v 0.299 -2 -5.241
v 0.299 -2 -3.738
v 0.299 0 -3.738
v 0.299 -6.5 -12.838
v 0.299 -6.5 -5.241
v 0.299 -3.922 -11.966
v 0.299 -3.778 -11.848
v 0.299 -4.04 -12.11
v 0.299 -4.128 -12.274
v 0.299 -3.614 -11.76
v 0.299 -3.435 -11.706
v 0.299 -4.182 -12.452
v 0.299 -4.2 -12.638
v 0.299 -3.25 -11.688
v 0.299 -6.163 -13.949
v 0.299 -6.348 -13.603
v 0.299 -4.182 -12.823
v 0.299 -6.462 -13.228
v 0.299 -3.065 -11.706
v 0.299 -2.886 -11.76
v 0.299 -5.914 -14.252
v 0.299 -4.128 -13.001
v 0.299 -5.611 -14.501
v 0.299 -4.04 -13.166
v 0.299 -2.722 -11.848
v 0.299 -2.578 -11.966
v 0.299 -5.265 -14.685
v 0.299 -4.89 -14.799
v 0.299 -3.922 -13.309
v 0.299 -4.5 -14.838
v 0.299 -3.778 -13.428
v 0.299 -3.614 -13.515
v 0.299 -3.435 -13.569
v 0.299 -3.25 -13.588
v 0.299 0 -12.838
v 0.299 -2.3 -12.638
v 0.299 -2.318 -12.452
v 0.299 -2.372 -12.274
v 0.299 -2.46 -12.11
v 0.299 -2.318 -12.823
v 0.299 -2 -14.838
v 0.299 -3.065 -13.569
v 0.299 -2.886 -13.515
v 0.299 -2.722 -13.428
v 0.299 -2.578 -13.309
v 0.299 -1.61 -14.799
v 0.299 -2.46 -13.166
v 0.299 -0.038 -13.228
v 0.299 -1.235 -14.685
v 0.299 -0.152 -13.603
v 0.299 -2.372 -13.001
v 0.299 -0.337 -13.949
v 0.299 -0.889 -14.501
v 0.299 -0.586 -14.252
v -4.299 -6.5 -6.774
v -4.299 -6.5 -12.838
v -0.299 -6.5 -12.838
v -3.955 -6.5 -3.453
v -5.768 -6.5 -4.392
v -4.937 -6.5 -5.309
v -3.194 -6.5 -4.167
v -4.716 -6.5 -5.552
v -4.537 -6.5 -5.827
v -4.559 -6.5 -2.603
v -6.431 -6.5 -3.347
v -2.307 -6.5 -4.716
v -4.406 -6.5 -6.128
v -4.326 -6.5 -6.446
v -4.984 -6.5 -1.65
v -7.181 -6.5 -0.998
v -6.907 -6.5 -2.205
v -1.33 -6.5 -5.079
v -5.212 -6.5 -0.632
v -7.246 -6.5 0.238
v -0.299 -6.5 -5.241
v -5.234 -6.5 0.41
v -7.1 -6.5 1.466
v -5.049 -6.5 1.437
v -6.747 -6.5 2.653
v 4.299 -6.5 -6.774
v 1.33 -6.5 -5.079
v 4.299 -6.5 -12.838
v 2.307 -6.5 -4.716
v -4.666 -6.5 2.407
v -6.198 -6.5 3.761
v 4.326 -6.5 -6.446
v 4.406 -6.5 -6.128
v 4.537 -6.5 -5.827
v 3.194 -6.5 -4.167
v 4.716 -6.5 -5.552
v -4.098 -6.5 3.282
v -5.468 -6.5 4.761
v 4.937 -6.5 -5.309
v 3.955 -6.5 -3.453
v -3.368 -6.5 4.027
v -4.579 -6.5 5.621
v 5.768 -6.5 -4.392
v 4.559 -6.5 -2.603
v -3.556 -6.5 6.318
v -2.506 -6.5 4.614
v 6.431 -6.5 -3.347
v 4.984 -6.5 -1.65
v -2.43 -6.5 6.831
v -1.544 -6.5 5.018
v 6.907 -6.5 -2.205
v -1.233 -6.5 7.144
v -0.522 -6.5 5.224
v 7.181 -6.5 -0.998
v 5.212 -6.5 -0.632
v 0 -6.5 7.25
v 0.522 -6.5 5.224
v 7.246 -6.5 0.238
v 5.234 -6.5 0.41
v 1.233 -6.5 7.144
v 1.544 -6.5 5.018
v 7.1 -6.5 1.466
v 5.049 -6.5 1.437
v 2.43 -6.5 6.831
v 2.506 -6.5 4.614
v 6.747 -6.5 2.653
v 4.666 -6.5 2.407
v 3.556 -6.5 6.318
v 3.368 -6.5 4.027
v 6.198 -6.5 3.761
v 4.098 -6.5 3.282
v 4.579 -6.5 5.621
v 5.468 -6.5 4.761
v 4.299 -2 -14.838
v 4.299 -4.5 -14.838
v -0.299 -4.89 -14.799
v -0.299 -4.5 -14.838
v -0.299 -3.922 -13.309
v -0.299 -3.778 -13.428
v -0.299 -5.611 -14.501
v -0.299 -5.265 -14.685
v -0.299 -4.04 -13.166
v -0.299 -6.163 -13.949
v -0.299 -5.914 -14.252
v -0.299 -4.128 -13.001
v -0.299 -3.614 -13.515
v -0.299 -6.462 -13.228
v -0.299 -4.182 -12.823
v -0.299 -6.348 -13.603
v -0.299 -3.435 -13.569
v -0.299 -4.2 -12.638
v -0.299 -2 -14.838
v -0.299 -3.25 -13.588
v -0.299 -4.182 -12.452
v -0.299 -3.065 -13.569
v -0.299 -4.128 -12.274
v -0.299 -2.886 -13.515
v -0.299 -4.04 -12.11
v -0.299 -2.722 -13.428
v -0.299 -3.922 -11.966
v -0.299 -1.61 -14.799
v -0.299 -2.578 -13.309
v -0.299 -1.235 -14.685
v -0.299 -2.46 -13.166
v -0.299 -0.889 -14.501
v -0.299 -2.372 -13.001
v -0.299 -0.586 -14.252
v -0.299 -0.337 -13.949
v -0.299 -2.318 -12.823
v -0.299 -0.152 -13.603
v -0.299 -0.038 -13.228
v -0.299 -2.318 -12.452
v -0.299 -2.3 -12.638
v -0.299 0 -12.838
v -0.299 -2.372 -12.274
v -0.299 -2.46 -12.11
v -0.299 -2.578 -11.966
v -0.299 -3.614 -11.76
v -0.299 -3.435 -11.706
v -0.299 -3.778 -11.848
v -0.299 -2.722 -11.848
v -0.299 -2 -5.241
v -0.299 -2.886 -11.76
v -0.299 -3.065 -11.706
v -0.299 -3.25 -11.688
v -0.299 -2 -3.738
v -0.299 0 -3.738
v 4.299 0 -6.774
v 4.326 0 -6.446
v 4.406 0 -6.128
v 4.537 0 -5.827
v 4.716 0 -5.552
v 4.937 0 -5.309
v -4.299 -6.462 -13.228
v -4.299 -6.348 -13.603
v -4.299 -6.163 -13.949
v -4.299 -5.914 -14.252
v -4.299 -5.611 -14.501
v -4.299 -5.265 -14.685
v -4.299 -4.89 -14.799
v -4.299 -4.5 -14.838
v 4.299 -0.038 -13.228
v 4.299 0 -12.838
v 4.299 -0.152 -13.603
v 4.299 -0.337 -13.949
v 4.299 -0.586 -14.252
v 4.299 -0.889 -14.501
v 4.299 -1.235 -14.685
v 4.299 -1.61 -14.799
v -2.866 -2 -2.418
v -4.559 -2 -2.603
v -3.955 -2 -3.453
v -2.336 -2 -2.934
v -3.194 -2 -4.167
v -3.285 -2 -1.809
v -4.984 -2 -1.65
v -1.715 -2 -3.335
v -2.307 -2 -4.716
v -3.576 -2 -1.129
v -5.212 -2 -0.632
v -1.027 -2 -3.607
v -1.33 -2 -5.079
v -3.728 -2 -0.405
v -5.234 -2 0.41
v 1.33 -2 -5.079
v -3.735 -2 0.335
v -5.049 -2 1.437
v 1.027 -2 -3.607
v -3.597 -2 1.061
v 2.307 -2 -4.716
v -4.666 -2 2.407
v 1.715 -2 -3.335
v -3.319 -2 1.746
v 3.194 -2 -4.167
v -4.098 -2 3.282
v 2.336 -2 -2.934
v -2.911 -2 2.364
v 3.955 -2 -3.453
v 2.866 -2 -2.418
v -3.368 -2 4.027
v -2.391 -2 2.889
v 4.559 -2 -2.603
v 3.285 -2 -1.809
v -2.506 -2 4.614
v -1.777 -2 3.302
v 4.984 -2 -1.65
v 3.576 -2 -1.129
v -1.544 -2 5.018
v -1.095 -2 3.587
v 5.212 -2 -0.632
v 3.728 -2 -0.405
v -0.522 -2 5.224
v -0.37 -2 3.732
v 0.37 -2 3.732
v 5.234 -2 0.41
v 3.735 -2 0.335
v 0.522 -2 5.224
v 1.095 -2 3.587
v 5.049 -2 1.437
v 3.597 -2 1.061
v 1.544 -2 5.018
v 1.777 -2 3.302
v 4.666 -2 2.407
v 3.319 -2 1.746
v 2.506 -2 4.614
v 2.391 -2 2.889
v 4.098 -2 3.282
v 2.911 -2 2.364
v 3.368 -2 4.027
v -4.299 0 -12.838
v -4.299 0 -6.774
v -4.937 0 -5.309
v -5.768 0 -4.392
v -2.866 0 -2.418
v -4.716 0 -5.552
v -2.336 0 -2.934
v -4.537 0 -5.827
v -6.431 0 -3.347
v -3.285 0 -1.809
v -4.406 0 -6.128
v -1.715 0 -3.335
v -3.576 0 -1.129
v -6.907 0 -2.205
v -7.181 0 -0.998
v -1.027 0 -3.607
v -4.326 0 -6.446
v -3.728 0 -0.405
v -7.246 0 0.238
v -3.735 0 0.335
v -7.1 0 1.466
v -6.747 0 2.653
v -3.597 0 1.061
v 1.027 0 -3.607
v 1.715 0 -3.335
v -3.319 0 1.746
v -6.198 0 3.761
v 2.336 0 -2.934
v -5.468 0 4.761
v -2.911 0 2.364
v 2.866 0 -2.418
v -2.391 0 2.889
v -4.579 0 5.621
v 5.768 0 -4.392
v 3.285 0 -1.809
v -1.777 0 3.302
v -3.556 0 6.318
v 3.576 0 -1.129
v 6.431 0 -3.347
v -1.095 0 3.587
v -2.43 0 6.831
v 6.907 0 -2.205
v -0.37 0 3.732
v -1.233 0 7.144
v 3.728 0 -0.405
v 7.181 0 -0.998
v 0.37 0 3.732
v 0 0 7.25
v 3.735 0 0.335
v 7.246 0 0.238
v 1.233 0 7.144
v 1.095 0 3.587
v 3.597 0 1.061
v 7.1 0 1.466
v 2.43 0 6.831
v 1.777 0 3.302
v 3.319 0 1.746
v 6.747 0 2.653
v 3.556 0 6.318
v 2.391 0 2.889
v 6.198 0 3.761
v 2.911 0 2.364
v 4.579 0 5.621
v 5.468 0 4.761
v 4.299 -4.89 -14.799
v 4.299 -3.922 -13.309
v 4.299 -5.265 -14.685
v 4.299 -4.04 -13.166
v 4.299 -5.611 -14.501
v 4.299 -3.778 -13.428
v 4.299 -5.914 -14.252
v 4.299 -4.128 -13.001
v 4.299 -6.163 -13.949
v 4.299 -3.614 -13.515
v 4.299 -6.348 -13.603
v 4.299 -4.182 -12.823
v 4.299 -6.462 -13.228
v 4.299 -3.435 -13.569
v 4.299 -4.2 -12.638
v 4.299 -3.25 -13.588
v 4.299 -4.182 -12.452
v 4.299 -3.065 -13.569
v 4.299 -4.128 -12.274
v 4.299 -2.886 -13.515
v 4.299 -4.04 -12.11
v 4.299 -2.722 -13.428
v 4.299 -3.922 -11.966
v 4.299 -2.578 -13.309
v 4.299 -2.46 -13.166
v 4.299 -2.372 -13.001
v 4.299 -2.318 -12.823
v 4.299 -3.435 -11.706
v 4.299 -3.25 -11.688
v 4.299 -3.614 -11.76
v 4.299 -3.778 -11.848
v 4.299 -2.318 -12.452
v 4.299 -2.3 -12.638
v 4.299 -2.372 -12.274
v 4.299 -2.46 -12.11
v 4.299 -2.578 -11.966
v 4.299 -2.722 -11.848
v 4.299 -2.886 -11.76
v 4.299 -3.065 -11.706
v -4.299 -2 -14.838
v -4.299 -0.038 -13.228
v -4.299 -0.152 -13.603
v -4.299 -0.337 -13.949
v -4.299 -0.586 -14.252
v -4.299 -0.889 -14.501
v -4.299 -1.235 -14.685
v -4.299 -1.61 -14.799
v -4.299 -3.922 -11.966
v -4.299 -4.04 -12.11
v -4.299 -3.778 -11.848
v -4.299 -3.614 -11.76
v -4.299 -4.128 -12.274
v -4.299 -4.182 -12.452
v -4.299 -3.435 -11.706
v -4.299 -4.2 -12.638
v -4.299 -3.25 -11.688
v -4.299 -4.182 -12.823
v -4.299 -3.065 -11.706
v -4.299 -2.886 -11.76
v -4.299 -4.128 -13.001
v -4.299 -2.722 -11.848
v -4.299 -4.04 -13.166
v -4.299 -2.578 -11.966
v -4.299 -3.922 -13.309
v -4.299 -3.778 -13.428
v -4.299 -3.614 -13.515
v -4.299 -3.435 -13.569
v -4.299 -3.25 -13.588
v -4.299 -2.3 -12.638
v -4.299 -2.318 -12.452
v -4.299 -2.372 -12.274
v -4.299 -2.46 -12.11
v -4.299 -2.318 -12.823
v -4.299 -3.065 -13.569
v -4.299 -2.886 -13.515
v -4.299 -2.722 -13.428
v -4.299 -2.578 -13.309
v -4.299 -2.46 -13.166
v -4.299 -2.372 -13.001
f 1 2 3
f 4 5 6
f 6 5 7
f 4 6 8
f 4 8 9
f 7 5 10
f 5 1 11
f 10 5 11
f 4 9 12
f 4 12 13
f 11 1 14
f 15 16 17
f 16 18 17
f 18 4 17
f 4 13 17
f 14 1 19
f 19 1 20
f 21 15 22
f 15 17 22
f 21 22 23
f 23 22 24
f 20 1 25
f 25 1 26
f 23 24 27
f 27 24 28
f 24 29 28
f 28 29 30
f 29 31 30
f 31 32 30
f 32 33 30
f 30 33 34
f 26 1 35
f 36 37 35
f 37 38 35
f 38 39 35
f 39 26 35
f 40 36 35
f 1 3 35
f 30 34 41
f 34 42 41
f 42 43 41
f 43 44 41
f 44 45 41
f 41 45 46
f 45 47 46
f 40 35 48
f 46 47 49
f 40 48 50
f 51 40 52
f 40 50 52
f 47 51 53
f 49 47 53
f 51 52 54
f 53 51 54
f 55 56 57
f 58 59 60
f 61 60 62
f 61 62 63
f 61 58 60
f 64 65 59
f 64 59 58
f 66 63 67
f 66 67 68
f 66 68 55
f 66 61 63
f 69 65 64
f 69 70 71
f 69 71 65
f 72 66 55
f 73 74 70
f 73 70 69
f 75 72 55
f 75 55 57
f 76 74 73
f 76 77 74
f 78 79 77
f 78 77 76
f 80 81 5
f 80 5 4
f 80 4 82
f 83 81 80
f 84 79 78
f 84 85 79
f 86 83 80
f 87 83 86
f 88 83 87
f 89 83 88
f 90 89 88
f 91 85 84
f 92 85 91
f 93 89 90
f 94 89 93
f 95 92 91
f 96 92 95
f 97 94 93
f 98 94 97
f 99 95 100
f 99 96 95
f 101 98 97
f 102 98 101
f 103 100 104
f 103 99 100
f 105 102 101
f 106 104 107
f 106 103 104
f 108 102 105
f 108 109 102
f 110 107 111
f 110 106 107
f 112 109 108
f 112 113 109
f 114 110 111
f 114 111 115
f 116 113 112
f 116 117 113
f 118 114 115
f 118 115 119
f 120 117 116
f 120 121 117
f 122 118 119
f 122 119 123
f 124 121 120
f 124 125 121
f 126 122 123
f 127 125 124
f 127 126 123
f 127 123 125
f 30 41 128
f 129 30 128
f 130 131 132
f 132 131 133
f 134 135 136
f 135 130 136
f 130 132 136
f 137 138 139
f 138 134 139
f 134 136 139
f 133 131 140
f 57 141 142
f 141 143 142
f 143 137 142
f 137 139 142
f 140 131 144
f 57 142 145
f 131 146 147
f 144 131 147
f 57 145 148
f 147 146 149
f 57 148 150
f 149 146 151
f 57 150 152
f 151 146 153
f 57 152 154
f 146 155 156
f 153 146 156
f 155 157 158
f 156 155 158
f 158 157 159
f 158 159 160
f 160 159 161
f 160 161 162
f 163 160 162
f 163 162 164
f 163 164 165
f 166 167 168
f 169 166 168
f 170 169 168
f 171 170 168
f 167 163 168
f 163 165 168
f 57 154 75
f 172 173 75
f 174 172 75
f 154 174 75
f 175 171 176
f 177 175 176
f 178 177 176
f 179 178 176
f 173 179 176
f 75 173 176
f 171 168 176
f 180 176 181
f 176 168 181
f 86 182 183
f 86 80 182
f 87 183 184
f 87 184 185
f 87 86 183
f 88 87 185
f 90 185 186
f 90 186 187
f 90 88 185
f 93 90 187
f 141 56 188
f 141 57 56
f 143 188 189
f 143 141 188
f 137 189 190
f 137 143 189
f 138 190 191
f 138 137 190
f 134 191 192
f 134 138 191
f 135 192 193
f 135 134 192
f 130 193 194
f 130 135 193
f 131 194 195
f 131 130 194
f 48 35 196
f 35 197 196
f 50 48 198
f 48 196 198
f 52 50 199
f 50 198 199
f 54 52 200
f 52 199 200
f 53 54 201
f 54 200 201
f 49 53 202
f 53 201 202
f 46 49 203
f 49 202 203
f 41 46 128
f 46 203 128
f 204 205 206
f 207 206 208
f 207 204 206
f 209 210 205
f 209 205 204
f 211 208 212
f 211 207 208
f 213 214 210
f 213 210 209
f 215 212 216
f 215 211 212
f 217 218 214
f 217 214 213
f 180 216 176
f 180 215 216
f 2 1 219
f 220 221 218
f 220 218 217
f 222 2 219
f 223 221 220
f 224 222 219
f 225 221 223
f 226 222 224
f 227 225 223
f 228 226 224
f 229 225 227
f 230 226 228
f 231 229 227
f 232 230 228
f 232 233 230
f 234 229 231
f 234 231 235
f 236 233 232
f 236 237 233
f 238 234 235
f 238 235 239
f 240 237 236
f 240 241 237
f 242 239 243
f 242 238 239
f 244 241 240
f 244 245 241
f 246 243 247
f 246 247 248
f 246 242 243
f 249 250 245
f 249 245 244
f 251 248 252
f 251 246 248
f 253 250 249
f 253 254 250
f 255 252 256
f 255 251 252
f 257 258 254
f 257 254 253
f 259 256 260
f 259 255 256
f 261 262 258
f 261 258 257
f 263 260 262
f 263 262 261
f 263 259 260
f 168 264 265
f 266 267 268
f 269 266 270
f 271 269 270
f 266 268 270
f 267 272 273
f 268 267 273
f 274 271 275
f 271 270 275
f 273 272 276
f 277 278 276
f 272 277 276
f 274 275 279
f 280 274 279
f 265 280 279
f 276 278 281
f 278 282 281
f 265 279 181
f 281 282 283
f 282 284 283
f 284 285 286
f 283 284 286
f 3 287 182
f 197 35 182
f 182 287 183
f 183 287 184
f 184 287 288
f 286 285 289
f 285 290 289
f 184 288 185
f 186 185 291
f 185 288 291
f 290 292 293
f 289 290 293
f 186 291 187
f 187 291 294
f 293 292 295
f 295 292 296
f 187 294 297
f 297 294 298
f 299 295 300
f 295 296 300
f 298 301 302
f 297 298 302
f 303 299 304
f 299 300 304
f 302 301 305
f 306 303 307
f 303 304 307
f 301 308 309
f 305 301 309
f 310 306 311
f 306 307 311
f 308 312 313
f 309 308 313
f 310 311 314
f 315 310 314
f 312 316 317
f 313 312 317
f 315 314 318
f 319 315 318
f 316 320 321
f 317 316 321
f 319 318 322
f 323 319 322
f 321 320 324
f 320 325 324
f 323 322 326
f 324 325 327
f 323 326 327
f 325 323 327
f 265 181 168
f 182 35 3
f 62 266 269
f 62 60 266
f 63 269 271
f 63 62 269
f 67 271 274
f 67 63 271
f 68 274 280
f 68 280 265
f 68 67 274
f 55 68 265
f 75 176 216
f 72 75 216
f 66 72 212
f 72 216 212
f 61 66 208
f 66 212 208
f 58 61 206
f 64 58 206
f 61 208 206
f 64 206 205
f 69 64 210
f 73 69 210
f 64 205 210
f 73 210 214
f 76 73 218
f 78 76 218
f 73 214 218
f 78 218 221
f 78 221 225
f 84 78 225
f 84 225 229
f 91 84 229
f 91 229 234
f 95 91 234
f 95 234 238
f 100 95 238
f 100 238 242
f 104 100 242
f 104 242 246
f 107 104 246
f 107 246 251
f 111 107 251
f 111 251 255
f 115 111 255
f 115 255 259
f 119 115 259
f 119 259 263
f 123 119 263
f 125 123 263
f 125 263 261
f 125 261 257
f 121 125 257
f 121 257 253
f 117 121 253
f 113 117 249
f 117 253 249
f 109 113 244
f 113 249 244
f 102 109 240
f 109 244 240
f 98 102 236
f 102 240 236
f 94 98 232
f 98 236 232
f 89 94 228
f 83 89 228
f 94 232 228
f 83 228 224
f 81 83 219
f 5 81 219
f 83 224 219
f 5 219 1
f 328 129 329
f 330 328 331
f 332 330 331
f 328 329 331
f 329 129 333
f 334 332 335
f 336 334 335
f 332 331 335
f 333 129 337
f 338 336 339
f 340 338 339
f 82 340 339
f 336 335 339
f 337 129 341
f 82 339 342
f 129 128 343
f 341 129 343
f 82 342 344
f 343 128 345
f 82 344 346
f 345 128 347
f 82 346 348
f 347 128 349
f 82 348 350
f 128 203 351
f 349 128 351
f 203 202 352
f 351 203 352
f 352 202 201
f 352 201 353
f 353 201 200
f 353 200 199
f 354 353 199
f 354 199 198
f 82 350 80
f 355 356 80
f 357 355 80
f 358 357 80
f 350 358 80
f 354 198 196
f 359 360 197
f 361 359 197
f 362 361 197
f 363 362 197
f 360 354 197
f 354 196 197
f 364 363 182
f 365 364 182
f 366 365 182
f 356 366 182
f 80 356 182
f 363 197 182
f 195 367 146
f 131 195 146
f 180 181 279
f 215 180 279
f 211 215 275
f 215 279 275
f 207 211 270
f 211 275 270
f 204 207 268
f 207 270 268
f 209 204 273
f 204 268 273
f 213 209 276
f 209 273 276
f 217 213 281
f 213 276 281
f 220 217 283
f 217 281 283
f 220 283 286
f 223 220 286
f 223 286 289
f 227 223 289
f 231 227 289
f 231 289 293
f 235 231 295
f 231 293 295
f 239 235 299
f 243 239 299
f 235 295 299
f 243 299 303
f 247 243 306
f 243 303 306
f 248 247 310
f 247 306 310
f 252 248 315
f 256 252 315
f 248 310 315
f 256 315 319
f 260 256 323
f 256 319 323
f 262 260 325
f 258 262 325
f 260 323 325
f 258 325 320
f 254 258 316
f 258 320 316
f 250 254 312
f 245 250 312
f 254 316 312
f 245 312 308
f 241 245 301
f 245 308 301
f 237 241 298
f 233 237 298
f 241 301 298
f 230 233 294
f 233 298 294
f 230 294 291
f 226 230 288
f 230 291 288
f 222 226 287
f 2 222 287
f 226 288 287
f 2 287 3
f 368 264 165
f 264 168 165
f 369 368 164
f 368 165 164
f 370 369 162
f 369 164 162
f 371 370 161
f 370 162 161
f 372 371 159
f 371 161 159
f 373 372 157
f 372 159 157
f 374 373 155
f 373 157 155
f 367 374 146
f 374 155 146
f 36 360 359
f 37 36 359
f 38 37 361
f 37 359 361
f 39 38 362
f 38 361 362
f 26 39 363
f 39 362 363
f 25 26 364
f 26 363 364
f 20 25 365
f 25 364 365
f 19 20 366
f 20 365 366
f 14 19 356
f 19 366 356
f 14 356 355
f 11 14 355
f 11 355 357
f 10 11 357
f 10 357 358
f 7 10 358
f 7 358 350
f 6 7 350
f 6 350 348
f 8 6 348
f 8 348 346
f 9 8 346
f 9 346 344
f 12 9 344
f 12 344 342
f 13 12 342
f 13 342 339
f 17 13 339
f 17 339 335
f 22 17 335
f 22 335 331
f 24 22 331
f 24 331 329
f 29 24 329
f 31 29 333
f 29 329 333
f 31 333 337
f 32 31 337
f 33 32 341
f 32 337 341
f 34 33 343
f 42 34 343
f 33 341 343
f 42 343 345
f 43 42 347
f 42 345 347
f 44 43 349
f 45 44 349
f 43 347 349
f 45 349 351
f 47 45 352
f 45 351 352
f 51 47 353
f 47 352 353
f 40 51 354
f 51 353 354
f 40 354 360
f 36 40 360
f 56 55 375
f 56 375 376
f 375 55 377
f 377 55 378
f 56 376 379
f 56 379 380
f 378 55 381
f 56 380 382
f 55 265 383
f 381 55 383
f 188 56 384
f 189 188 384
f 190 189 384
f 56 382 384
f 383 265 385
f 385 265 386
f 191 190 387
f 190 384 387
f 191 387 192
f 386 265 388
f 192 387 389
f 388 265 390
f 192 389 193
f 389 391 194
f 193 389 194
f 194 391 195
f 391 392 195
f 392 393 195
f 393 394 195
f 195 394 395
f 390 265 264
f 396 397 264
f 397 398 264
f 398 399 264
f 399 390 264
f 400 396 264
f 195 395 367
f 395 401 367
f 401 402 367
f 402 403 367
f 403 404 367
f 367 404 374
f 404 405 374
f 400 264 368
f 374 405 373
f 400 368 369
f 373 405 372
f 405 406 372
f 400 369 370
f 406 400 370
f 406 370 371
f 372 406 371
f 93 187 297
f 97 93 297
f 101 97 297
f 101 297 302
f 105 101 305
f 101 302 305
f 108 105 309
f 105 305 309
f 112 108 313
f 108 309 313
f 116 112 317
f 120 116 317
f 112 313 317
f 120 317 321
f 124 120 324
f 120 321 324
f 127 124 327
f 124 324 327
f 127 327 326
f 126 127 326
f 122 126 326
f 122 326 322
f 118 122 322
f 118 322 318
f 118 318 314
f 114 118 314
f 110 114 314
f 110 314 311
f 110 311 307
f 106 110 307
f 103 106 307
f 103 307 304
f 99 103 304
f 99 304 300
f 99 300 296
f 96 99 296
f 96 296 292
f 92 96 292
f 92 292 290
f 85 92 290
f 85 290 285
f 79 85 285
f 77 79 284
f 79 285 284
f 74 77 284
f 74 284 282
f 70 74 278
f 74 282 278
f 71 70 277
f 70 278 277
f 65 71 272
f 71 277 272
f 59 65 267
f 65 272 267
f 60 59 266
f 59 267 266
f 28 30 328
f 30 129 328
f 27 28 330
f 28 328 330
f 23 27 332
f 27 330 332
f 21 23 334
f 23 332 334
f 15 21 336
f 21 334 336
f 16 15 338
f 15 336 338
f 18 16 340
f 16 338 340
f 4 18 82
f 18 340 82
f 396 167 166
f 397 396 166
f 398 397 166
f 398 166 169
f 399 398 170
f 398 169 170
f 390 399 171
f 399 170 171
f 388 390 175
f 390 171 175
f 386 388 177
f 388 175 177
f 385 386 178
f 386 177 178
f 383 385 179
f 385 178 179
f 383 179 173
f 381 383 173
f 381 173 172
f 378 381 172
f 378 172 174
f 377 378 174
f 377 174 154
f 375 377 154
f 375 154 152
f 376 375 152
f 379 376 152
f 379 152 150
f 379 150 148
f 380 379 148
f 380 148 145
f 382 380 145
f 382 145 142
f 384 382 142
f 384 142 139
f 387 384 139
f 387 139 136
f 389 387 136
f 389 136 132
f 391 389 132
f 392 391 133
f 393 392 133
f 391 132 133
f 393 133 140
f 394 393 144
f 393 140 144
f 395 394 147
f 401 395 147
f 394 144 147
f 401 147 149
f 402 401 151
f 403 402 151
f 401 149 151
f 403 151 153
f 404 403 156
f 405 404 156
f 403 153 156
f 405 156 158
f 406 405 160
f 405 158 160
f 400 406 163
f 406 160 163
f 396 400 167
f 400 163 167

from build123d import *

# Parameters (mm, degrees)
F1_DEPTH = 6.5
F2_DEPTH = 2
F3_R     = 0.95
F4_DEPTH = 25
F5_R     = 2
F6_R     = 2


with BuildPart() as f1:
    # F0 (on Front) → F1 (new body)
    with BuildSketch(Plane.XZ):
        with BuildLine():
            Line((4.29925, -14.837718), (4.29925, -5.837718))
            ThreePointArc((4.29925, -5.837718), (0, 7.25), (-4.29925, -5.837718))
            Line((-4.29925, -5.837718), (-4.29925, -14.837718))
            Line((-4.29925, -14.837718), (-0.29925, -14.837718))
            Line((-0.29925, -14.837718), (-0.29925, -5.241464))
            ThreePointArc((-0.29925, -5.241464), (0, 5.25), (0.29925, -5.241464))
            Line((0.29925, -5.241464), (0.29925, -14.837718))
            Line((0.29925, -14.837718), (4.29925, -14.837718))
        make_face()
    extrude(amount=F1_DEPTH)

    # F0 (on Front) → F2 (join)
    with BuildSketch(Plane.XZ):
        with BuildLine():
            Line((0.29925, -3.738041), (0.29925, -5.241464))
            ThreePointArc((0.29925, -5.241464), (0, 5.25), (-0.29925, -5.241464))
            Line((-0.29925, -5.241464), (-0.29925, -3.738041))
            ThreePointArc((-0.29925, -3.738041), (0, 3.75), (0.29925, -3.738041))
        make_face()
    extrude(amount=F2_DEPTH)

    # F3 (on face) → F4 (cut)
    with BuildSketch(Plane.YZ.offset(4.29925)):
        with Locations((-3.25, -12.637718)):
            Circle(F3_R)
    extrude(amount=-F4_DEPTH, mode=Mode.SUBTRACT)

    # F5
    f5_edges = [f1.edges().sort_by_distance(p)[0] for p in [
        (2.29925, 0, -14.837718),
        (-2.29925, 0, -14.837718),
        (2.29925, -6.5, -14.837718),
        (-2.29925, -6.5, -14.837718),
    ]]
    fillet(f5_edges, radius=F5_R)

    # F6
    f6_edges = [f1.edges().sort_by_distance(p)[0] for p in [
        (4.29925, -3.25, -5.837718),
        (-4.29925, -3.25, -5.837718),
    ]]
    fillet(f6_edges, radius=F6_R)


solid = f1.part
